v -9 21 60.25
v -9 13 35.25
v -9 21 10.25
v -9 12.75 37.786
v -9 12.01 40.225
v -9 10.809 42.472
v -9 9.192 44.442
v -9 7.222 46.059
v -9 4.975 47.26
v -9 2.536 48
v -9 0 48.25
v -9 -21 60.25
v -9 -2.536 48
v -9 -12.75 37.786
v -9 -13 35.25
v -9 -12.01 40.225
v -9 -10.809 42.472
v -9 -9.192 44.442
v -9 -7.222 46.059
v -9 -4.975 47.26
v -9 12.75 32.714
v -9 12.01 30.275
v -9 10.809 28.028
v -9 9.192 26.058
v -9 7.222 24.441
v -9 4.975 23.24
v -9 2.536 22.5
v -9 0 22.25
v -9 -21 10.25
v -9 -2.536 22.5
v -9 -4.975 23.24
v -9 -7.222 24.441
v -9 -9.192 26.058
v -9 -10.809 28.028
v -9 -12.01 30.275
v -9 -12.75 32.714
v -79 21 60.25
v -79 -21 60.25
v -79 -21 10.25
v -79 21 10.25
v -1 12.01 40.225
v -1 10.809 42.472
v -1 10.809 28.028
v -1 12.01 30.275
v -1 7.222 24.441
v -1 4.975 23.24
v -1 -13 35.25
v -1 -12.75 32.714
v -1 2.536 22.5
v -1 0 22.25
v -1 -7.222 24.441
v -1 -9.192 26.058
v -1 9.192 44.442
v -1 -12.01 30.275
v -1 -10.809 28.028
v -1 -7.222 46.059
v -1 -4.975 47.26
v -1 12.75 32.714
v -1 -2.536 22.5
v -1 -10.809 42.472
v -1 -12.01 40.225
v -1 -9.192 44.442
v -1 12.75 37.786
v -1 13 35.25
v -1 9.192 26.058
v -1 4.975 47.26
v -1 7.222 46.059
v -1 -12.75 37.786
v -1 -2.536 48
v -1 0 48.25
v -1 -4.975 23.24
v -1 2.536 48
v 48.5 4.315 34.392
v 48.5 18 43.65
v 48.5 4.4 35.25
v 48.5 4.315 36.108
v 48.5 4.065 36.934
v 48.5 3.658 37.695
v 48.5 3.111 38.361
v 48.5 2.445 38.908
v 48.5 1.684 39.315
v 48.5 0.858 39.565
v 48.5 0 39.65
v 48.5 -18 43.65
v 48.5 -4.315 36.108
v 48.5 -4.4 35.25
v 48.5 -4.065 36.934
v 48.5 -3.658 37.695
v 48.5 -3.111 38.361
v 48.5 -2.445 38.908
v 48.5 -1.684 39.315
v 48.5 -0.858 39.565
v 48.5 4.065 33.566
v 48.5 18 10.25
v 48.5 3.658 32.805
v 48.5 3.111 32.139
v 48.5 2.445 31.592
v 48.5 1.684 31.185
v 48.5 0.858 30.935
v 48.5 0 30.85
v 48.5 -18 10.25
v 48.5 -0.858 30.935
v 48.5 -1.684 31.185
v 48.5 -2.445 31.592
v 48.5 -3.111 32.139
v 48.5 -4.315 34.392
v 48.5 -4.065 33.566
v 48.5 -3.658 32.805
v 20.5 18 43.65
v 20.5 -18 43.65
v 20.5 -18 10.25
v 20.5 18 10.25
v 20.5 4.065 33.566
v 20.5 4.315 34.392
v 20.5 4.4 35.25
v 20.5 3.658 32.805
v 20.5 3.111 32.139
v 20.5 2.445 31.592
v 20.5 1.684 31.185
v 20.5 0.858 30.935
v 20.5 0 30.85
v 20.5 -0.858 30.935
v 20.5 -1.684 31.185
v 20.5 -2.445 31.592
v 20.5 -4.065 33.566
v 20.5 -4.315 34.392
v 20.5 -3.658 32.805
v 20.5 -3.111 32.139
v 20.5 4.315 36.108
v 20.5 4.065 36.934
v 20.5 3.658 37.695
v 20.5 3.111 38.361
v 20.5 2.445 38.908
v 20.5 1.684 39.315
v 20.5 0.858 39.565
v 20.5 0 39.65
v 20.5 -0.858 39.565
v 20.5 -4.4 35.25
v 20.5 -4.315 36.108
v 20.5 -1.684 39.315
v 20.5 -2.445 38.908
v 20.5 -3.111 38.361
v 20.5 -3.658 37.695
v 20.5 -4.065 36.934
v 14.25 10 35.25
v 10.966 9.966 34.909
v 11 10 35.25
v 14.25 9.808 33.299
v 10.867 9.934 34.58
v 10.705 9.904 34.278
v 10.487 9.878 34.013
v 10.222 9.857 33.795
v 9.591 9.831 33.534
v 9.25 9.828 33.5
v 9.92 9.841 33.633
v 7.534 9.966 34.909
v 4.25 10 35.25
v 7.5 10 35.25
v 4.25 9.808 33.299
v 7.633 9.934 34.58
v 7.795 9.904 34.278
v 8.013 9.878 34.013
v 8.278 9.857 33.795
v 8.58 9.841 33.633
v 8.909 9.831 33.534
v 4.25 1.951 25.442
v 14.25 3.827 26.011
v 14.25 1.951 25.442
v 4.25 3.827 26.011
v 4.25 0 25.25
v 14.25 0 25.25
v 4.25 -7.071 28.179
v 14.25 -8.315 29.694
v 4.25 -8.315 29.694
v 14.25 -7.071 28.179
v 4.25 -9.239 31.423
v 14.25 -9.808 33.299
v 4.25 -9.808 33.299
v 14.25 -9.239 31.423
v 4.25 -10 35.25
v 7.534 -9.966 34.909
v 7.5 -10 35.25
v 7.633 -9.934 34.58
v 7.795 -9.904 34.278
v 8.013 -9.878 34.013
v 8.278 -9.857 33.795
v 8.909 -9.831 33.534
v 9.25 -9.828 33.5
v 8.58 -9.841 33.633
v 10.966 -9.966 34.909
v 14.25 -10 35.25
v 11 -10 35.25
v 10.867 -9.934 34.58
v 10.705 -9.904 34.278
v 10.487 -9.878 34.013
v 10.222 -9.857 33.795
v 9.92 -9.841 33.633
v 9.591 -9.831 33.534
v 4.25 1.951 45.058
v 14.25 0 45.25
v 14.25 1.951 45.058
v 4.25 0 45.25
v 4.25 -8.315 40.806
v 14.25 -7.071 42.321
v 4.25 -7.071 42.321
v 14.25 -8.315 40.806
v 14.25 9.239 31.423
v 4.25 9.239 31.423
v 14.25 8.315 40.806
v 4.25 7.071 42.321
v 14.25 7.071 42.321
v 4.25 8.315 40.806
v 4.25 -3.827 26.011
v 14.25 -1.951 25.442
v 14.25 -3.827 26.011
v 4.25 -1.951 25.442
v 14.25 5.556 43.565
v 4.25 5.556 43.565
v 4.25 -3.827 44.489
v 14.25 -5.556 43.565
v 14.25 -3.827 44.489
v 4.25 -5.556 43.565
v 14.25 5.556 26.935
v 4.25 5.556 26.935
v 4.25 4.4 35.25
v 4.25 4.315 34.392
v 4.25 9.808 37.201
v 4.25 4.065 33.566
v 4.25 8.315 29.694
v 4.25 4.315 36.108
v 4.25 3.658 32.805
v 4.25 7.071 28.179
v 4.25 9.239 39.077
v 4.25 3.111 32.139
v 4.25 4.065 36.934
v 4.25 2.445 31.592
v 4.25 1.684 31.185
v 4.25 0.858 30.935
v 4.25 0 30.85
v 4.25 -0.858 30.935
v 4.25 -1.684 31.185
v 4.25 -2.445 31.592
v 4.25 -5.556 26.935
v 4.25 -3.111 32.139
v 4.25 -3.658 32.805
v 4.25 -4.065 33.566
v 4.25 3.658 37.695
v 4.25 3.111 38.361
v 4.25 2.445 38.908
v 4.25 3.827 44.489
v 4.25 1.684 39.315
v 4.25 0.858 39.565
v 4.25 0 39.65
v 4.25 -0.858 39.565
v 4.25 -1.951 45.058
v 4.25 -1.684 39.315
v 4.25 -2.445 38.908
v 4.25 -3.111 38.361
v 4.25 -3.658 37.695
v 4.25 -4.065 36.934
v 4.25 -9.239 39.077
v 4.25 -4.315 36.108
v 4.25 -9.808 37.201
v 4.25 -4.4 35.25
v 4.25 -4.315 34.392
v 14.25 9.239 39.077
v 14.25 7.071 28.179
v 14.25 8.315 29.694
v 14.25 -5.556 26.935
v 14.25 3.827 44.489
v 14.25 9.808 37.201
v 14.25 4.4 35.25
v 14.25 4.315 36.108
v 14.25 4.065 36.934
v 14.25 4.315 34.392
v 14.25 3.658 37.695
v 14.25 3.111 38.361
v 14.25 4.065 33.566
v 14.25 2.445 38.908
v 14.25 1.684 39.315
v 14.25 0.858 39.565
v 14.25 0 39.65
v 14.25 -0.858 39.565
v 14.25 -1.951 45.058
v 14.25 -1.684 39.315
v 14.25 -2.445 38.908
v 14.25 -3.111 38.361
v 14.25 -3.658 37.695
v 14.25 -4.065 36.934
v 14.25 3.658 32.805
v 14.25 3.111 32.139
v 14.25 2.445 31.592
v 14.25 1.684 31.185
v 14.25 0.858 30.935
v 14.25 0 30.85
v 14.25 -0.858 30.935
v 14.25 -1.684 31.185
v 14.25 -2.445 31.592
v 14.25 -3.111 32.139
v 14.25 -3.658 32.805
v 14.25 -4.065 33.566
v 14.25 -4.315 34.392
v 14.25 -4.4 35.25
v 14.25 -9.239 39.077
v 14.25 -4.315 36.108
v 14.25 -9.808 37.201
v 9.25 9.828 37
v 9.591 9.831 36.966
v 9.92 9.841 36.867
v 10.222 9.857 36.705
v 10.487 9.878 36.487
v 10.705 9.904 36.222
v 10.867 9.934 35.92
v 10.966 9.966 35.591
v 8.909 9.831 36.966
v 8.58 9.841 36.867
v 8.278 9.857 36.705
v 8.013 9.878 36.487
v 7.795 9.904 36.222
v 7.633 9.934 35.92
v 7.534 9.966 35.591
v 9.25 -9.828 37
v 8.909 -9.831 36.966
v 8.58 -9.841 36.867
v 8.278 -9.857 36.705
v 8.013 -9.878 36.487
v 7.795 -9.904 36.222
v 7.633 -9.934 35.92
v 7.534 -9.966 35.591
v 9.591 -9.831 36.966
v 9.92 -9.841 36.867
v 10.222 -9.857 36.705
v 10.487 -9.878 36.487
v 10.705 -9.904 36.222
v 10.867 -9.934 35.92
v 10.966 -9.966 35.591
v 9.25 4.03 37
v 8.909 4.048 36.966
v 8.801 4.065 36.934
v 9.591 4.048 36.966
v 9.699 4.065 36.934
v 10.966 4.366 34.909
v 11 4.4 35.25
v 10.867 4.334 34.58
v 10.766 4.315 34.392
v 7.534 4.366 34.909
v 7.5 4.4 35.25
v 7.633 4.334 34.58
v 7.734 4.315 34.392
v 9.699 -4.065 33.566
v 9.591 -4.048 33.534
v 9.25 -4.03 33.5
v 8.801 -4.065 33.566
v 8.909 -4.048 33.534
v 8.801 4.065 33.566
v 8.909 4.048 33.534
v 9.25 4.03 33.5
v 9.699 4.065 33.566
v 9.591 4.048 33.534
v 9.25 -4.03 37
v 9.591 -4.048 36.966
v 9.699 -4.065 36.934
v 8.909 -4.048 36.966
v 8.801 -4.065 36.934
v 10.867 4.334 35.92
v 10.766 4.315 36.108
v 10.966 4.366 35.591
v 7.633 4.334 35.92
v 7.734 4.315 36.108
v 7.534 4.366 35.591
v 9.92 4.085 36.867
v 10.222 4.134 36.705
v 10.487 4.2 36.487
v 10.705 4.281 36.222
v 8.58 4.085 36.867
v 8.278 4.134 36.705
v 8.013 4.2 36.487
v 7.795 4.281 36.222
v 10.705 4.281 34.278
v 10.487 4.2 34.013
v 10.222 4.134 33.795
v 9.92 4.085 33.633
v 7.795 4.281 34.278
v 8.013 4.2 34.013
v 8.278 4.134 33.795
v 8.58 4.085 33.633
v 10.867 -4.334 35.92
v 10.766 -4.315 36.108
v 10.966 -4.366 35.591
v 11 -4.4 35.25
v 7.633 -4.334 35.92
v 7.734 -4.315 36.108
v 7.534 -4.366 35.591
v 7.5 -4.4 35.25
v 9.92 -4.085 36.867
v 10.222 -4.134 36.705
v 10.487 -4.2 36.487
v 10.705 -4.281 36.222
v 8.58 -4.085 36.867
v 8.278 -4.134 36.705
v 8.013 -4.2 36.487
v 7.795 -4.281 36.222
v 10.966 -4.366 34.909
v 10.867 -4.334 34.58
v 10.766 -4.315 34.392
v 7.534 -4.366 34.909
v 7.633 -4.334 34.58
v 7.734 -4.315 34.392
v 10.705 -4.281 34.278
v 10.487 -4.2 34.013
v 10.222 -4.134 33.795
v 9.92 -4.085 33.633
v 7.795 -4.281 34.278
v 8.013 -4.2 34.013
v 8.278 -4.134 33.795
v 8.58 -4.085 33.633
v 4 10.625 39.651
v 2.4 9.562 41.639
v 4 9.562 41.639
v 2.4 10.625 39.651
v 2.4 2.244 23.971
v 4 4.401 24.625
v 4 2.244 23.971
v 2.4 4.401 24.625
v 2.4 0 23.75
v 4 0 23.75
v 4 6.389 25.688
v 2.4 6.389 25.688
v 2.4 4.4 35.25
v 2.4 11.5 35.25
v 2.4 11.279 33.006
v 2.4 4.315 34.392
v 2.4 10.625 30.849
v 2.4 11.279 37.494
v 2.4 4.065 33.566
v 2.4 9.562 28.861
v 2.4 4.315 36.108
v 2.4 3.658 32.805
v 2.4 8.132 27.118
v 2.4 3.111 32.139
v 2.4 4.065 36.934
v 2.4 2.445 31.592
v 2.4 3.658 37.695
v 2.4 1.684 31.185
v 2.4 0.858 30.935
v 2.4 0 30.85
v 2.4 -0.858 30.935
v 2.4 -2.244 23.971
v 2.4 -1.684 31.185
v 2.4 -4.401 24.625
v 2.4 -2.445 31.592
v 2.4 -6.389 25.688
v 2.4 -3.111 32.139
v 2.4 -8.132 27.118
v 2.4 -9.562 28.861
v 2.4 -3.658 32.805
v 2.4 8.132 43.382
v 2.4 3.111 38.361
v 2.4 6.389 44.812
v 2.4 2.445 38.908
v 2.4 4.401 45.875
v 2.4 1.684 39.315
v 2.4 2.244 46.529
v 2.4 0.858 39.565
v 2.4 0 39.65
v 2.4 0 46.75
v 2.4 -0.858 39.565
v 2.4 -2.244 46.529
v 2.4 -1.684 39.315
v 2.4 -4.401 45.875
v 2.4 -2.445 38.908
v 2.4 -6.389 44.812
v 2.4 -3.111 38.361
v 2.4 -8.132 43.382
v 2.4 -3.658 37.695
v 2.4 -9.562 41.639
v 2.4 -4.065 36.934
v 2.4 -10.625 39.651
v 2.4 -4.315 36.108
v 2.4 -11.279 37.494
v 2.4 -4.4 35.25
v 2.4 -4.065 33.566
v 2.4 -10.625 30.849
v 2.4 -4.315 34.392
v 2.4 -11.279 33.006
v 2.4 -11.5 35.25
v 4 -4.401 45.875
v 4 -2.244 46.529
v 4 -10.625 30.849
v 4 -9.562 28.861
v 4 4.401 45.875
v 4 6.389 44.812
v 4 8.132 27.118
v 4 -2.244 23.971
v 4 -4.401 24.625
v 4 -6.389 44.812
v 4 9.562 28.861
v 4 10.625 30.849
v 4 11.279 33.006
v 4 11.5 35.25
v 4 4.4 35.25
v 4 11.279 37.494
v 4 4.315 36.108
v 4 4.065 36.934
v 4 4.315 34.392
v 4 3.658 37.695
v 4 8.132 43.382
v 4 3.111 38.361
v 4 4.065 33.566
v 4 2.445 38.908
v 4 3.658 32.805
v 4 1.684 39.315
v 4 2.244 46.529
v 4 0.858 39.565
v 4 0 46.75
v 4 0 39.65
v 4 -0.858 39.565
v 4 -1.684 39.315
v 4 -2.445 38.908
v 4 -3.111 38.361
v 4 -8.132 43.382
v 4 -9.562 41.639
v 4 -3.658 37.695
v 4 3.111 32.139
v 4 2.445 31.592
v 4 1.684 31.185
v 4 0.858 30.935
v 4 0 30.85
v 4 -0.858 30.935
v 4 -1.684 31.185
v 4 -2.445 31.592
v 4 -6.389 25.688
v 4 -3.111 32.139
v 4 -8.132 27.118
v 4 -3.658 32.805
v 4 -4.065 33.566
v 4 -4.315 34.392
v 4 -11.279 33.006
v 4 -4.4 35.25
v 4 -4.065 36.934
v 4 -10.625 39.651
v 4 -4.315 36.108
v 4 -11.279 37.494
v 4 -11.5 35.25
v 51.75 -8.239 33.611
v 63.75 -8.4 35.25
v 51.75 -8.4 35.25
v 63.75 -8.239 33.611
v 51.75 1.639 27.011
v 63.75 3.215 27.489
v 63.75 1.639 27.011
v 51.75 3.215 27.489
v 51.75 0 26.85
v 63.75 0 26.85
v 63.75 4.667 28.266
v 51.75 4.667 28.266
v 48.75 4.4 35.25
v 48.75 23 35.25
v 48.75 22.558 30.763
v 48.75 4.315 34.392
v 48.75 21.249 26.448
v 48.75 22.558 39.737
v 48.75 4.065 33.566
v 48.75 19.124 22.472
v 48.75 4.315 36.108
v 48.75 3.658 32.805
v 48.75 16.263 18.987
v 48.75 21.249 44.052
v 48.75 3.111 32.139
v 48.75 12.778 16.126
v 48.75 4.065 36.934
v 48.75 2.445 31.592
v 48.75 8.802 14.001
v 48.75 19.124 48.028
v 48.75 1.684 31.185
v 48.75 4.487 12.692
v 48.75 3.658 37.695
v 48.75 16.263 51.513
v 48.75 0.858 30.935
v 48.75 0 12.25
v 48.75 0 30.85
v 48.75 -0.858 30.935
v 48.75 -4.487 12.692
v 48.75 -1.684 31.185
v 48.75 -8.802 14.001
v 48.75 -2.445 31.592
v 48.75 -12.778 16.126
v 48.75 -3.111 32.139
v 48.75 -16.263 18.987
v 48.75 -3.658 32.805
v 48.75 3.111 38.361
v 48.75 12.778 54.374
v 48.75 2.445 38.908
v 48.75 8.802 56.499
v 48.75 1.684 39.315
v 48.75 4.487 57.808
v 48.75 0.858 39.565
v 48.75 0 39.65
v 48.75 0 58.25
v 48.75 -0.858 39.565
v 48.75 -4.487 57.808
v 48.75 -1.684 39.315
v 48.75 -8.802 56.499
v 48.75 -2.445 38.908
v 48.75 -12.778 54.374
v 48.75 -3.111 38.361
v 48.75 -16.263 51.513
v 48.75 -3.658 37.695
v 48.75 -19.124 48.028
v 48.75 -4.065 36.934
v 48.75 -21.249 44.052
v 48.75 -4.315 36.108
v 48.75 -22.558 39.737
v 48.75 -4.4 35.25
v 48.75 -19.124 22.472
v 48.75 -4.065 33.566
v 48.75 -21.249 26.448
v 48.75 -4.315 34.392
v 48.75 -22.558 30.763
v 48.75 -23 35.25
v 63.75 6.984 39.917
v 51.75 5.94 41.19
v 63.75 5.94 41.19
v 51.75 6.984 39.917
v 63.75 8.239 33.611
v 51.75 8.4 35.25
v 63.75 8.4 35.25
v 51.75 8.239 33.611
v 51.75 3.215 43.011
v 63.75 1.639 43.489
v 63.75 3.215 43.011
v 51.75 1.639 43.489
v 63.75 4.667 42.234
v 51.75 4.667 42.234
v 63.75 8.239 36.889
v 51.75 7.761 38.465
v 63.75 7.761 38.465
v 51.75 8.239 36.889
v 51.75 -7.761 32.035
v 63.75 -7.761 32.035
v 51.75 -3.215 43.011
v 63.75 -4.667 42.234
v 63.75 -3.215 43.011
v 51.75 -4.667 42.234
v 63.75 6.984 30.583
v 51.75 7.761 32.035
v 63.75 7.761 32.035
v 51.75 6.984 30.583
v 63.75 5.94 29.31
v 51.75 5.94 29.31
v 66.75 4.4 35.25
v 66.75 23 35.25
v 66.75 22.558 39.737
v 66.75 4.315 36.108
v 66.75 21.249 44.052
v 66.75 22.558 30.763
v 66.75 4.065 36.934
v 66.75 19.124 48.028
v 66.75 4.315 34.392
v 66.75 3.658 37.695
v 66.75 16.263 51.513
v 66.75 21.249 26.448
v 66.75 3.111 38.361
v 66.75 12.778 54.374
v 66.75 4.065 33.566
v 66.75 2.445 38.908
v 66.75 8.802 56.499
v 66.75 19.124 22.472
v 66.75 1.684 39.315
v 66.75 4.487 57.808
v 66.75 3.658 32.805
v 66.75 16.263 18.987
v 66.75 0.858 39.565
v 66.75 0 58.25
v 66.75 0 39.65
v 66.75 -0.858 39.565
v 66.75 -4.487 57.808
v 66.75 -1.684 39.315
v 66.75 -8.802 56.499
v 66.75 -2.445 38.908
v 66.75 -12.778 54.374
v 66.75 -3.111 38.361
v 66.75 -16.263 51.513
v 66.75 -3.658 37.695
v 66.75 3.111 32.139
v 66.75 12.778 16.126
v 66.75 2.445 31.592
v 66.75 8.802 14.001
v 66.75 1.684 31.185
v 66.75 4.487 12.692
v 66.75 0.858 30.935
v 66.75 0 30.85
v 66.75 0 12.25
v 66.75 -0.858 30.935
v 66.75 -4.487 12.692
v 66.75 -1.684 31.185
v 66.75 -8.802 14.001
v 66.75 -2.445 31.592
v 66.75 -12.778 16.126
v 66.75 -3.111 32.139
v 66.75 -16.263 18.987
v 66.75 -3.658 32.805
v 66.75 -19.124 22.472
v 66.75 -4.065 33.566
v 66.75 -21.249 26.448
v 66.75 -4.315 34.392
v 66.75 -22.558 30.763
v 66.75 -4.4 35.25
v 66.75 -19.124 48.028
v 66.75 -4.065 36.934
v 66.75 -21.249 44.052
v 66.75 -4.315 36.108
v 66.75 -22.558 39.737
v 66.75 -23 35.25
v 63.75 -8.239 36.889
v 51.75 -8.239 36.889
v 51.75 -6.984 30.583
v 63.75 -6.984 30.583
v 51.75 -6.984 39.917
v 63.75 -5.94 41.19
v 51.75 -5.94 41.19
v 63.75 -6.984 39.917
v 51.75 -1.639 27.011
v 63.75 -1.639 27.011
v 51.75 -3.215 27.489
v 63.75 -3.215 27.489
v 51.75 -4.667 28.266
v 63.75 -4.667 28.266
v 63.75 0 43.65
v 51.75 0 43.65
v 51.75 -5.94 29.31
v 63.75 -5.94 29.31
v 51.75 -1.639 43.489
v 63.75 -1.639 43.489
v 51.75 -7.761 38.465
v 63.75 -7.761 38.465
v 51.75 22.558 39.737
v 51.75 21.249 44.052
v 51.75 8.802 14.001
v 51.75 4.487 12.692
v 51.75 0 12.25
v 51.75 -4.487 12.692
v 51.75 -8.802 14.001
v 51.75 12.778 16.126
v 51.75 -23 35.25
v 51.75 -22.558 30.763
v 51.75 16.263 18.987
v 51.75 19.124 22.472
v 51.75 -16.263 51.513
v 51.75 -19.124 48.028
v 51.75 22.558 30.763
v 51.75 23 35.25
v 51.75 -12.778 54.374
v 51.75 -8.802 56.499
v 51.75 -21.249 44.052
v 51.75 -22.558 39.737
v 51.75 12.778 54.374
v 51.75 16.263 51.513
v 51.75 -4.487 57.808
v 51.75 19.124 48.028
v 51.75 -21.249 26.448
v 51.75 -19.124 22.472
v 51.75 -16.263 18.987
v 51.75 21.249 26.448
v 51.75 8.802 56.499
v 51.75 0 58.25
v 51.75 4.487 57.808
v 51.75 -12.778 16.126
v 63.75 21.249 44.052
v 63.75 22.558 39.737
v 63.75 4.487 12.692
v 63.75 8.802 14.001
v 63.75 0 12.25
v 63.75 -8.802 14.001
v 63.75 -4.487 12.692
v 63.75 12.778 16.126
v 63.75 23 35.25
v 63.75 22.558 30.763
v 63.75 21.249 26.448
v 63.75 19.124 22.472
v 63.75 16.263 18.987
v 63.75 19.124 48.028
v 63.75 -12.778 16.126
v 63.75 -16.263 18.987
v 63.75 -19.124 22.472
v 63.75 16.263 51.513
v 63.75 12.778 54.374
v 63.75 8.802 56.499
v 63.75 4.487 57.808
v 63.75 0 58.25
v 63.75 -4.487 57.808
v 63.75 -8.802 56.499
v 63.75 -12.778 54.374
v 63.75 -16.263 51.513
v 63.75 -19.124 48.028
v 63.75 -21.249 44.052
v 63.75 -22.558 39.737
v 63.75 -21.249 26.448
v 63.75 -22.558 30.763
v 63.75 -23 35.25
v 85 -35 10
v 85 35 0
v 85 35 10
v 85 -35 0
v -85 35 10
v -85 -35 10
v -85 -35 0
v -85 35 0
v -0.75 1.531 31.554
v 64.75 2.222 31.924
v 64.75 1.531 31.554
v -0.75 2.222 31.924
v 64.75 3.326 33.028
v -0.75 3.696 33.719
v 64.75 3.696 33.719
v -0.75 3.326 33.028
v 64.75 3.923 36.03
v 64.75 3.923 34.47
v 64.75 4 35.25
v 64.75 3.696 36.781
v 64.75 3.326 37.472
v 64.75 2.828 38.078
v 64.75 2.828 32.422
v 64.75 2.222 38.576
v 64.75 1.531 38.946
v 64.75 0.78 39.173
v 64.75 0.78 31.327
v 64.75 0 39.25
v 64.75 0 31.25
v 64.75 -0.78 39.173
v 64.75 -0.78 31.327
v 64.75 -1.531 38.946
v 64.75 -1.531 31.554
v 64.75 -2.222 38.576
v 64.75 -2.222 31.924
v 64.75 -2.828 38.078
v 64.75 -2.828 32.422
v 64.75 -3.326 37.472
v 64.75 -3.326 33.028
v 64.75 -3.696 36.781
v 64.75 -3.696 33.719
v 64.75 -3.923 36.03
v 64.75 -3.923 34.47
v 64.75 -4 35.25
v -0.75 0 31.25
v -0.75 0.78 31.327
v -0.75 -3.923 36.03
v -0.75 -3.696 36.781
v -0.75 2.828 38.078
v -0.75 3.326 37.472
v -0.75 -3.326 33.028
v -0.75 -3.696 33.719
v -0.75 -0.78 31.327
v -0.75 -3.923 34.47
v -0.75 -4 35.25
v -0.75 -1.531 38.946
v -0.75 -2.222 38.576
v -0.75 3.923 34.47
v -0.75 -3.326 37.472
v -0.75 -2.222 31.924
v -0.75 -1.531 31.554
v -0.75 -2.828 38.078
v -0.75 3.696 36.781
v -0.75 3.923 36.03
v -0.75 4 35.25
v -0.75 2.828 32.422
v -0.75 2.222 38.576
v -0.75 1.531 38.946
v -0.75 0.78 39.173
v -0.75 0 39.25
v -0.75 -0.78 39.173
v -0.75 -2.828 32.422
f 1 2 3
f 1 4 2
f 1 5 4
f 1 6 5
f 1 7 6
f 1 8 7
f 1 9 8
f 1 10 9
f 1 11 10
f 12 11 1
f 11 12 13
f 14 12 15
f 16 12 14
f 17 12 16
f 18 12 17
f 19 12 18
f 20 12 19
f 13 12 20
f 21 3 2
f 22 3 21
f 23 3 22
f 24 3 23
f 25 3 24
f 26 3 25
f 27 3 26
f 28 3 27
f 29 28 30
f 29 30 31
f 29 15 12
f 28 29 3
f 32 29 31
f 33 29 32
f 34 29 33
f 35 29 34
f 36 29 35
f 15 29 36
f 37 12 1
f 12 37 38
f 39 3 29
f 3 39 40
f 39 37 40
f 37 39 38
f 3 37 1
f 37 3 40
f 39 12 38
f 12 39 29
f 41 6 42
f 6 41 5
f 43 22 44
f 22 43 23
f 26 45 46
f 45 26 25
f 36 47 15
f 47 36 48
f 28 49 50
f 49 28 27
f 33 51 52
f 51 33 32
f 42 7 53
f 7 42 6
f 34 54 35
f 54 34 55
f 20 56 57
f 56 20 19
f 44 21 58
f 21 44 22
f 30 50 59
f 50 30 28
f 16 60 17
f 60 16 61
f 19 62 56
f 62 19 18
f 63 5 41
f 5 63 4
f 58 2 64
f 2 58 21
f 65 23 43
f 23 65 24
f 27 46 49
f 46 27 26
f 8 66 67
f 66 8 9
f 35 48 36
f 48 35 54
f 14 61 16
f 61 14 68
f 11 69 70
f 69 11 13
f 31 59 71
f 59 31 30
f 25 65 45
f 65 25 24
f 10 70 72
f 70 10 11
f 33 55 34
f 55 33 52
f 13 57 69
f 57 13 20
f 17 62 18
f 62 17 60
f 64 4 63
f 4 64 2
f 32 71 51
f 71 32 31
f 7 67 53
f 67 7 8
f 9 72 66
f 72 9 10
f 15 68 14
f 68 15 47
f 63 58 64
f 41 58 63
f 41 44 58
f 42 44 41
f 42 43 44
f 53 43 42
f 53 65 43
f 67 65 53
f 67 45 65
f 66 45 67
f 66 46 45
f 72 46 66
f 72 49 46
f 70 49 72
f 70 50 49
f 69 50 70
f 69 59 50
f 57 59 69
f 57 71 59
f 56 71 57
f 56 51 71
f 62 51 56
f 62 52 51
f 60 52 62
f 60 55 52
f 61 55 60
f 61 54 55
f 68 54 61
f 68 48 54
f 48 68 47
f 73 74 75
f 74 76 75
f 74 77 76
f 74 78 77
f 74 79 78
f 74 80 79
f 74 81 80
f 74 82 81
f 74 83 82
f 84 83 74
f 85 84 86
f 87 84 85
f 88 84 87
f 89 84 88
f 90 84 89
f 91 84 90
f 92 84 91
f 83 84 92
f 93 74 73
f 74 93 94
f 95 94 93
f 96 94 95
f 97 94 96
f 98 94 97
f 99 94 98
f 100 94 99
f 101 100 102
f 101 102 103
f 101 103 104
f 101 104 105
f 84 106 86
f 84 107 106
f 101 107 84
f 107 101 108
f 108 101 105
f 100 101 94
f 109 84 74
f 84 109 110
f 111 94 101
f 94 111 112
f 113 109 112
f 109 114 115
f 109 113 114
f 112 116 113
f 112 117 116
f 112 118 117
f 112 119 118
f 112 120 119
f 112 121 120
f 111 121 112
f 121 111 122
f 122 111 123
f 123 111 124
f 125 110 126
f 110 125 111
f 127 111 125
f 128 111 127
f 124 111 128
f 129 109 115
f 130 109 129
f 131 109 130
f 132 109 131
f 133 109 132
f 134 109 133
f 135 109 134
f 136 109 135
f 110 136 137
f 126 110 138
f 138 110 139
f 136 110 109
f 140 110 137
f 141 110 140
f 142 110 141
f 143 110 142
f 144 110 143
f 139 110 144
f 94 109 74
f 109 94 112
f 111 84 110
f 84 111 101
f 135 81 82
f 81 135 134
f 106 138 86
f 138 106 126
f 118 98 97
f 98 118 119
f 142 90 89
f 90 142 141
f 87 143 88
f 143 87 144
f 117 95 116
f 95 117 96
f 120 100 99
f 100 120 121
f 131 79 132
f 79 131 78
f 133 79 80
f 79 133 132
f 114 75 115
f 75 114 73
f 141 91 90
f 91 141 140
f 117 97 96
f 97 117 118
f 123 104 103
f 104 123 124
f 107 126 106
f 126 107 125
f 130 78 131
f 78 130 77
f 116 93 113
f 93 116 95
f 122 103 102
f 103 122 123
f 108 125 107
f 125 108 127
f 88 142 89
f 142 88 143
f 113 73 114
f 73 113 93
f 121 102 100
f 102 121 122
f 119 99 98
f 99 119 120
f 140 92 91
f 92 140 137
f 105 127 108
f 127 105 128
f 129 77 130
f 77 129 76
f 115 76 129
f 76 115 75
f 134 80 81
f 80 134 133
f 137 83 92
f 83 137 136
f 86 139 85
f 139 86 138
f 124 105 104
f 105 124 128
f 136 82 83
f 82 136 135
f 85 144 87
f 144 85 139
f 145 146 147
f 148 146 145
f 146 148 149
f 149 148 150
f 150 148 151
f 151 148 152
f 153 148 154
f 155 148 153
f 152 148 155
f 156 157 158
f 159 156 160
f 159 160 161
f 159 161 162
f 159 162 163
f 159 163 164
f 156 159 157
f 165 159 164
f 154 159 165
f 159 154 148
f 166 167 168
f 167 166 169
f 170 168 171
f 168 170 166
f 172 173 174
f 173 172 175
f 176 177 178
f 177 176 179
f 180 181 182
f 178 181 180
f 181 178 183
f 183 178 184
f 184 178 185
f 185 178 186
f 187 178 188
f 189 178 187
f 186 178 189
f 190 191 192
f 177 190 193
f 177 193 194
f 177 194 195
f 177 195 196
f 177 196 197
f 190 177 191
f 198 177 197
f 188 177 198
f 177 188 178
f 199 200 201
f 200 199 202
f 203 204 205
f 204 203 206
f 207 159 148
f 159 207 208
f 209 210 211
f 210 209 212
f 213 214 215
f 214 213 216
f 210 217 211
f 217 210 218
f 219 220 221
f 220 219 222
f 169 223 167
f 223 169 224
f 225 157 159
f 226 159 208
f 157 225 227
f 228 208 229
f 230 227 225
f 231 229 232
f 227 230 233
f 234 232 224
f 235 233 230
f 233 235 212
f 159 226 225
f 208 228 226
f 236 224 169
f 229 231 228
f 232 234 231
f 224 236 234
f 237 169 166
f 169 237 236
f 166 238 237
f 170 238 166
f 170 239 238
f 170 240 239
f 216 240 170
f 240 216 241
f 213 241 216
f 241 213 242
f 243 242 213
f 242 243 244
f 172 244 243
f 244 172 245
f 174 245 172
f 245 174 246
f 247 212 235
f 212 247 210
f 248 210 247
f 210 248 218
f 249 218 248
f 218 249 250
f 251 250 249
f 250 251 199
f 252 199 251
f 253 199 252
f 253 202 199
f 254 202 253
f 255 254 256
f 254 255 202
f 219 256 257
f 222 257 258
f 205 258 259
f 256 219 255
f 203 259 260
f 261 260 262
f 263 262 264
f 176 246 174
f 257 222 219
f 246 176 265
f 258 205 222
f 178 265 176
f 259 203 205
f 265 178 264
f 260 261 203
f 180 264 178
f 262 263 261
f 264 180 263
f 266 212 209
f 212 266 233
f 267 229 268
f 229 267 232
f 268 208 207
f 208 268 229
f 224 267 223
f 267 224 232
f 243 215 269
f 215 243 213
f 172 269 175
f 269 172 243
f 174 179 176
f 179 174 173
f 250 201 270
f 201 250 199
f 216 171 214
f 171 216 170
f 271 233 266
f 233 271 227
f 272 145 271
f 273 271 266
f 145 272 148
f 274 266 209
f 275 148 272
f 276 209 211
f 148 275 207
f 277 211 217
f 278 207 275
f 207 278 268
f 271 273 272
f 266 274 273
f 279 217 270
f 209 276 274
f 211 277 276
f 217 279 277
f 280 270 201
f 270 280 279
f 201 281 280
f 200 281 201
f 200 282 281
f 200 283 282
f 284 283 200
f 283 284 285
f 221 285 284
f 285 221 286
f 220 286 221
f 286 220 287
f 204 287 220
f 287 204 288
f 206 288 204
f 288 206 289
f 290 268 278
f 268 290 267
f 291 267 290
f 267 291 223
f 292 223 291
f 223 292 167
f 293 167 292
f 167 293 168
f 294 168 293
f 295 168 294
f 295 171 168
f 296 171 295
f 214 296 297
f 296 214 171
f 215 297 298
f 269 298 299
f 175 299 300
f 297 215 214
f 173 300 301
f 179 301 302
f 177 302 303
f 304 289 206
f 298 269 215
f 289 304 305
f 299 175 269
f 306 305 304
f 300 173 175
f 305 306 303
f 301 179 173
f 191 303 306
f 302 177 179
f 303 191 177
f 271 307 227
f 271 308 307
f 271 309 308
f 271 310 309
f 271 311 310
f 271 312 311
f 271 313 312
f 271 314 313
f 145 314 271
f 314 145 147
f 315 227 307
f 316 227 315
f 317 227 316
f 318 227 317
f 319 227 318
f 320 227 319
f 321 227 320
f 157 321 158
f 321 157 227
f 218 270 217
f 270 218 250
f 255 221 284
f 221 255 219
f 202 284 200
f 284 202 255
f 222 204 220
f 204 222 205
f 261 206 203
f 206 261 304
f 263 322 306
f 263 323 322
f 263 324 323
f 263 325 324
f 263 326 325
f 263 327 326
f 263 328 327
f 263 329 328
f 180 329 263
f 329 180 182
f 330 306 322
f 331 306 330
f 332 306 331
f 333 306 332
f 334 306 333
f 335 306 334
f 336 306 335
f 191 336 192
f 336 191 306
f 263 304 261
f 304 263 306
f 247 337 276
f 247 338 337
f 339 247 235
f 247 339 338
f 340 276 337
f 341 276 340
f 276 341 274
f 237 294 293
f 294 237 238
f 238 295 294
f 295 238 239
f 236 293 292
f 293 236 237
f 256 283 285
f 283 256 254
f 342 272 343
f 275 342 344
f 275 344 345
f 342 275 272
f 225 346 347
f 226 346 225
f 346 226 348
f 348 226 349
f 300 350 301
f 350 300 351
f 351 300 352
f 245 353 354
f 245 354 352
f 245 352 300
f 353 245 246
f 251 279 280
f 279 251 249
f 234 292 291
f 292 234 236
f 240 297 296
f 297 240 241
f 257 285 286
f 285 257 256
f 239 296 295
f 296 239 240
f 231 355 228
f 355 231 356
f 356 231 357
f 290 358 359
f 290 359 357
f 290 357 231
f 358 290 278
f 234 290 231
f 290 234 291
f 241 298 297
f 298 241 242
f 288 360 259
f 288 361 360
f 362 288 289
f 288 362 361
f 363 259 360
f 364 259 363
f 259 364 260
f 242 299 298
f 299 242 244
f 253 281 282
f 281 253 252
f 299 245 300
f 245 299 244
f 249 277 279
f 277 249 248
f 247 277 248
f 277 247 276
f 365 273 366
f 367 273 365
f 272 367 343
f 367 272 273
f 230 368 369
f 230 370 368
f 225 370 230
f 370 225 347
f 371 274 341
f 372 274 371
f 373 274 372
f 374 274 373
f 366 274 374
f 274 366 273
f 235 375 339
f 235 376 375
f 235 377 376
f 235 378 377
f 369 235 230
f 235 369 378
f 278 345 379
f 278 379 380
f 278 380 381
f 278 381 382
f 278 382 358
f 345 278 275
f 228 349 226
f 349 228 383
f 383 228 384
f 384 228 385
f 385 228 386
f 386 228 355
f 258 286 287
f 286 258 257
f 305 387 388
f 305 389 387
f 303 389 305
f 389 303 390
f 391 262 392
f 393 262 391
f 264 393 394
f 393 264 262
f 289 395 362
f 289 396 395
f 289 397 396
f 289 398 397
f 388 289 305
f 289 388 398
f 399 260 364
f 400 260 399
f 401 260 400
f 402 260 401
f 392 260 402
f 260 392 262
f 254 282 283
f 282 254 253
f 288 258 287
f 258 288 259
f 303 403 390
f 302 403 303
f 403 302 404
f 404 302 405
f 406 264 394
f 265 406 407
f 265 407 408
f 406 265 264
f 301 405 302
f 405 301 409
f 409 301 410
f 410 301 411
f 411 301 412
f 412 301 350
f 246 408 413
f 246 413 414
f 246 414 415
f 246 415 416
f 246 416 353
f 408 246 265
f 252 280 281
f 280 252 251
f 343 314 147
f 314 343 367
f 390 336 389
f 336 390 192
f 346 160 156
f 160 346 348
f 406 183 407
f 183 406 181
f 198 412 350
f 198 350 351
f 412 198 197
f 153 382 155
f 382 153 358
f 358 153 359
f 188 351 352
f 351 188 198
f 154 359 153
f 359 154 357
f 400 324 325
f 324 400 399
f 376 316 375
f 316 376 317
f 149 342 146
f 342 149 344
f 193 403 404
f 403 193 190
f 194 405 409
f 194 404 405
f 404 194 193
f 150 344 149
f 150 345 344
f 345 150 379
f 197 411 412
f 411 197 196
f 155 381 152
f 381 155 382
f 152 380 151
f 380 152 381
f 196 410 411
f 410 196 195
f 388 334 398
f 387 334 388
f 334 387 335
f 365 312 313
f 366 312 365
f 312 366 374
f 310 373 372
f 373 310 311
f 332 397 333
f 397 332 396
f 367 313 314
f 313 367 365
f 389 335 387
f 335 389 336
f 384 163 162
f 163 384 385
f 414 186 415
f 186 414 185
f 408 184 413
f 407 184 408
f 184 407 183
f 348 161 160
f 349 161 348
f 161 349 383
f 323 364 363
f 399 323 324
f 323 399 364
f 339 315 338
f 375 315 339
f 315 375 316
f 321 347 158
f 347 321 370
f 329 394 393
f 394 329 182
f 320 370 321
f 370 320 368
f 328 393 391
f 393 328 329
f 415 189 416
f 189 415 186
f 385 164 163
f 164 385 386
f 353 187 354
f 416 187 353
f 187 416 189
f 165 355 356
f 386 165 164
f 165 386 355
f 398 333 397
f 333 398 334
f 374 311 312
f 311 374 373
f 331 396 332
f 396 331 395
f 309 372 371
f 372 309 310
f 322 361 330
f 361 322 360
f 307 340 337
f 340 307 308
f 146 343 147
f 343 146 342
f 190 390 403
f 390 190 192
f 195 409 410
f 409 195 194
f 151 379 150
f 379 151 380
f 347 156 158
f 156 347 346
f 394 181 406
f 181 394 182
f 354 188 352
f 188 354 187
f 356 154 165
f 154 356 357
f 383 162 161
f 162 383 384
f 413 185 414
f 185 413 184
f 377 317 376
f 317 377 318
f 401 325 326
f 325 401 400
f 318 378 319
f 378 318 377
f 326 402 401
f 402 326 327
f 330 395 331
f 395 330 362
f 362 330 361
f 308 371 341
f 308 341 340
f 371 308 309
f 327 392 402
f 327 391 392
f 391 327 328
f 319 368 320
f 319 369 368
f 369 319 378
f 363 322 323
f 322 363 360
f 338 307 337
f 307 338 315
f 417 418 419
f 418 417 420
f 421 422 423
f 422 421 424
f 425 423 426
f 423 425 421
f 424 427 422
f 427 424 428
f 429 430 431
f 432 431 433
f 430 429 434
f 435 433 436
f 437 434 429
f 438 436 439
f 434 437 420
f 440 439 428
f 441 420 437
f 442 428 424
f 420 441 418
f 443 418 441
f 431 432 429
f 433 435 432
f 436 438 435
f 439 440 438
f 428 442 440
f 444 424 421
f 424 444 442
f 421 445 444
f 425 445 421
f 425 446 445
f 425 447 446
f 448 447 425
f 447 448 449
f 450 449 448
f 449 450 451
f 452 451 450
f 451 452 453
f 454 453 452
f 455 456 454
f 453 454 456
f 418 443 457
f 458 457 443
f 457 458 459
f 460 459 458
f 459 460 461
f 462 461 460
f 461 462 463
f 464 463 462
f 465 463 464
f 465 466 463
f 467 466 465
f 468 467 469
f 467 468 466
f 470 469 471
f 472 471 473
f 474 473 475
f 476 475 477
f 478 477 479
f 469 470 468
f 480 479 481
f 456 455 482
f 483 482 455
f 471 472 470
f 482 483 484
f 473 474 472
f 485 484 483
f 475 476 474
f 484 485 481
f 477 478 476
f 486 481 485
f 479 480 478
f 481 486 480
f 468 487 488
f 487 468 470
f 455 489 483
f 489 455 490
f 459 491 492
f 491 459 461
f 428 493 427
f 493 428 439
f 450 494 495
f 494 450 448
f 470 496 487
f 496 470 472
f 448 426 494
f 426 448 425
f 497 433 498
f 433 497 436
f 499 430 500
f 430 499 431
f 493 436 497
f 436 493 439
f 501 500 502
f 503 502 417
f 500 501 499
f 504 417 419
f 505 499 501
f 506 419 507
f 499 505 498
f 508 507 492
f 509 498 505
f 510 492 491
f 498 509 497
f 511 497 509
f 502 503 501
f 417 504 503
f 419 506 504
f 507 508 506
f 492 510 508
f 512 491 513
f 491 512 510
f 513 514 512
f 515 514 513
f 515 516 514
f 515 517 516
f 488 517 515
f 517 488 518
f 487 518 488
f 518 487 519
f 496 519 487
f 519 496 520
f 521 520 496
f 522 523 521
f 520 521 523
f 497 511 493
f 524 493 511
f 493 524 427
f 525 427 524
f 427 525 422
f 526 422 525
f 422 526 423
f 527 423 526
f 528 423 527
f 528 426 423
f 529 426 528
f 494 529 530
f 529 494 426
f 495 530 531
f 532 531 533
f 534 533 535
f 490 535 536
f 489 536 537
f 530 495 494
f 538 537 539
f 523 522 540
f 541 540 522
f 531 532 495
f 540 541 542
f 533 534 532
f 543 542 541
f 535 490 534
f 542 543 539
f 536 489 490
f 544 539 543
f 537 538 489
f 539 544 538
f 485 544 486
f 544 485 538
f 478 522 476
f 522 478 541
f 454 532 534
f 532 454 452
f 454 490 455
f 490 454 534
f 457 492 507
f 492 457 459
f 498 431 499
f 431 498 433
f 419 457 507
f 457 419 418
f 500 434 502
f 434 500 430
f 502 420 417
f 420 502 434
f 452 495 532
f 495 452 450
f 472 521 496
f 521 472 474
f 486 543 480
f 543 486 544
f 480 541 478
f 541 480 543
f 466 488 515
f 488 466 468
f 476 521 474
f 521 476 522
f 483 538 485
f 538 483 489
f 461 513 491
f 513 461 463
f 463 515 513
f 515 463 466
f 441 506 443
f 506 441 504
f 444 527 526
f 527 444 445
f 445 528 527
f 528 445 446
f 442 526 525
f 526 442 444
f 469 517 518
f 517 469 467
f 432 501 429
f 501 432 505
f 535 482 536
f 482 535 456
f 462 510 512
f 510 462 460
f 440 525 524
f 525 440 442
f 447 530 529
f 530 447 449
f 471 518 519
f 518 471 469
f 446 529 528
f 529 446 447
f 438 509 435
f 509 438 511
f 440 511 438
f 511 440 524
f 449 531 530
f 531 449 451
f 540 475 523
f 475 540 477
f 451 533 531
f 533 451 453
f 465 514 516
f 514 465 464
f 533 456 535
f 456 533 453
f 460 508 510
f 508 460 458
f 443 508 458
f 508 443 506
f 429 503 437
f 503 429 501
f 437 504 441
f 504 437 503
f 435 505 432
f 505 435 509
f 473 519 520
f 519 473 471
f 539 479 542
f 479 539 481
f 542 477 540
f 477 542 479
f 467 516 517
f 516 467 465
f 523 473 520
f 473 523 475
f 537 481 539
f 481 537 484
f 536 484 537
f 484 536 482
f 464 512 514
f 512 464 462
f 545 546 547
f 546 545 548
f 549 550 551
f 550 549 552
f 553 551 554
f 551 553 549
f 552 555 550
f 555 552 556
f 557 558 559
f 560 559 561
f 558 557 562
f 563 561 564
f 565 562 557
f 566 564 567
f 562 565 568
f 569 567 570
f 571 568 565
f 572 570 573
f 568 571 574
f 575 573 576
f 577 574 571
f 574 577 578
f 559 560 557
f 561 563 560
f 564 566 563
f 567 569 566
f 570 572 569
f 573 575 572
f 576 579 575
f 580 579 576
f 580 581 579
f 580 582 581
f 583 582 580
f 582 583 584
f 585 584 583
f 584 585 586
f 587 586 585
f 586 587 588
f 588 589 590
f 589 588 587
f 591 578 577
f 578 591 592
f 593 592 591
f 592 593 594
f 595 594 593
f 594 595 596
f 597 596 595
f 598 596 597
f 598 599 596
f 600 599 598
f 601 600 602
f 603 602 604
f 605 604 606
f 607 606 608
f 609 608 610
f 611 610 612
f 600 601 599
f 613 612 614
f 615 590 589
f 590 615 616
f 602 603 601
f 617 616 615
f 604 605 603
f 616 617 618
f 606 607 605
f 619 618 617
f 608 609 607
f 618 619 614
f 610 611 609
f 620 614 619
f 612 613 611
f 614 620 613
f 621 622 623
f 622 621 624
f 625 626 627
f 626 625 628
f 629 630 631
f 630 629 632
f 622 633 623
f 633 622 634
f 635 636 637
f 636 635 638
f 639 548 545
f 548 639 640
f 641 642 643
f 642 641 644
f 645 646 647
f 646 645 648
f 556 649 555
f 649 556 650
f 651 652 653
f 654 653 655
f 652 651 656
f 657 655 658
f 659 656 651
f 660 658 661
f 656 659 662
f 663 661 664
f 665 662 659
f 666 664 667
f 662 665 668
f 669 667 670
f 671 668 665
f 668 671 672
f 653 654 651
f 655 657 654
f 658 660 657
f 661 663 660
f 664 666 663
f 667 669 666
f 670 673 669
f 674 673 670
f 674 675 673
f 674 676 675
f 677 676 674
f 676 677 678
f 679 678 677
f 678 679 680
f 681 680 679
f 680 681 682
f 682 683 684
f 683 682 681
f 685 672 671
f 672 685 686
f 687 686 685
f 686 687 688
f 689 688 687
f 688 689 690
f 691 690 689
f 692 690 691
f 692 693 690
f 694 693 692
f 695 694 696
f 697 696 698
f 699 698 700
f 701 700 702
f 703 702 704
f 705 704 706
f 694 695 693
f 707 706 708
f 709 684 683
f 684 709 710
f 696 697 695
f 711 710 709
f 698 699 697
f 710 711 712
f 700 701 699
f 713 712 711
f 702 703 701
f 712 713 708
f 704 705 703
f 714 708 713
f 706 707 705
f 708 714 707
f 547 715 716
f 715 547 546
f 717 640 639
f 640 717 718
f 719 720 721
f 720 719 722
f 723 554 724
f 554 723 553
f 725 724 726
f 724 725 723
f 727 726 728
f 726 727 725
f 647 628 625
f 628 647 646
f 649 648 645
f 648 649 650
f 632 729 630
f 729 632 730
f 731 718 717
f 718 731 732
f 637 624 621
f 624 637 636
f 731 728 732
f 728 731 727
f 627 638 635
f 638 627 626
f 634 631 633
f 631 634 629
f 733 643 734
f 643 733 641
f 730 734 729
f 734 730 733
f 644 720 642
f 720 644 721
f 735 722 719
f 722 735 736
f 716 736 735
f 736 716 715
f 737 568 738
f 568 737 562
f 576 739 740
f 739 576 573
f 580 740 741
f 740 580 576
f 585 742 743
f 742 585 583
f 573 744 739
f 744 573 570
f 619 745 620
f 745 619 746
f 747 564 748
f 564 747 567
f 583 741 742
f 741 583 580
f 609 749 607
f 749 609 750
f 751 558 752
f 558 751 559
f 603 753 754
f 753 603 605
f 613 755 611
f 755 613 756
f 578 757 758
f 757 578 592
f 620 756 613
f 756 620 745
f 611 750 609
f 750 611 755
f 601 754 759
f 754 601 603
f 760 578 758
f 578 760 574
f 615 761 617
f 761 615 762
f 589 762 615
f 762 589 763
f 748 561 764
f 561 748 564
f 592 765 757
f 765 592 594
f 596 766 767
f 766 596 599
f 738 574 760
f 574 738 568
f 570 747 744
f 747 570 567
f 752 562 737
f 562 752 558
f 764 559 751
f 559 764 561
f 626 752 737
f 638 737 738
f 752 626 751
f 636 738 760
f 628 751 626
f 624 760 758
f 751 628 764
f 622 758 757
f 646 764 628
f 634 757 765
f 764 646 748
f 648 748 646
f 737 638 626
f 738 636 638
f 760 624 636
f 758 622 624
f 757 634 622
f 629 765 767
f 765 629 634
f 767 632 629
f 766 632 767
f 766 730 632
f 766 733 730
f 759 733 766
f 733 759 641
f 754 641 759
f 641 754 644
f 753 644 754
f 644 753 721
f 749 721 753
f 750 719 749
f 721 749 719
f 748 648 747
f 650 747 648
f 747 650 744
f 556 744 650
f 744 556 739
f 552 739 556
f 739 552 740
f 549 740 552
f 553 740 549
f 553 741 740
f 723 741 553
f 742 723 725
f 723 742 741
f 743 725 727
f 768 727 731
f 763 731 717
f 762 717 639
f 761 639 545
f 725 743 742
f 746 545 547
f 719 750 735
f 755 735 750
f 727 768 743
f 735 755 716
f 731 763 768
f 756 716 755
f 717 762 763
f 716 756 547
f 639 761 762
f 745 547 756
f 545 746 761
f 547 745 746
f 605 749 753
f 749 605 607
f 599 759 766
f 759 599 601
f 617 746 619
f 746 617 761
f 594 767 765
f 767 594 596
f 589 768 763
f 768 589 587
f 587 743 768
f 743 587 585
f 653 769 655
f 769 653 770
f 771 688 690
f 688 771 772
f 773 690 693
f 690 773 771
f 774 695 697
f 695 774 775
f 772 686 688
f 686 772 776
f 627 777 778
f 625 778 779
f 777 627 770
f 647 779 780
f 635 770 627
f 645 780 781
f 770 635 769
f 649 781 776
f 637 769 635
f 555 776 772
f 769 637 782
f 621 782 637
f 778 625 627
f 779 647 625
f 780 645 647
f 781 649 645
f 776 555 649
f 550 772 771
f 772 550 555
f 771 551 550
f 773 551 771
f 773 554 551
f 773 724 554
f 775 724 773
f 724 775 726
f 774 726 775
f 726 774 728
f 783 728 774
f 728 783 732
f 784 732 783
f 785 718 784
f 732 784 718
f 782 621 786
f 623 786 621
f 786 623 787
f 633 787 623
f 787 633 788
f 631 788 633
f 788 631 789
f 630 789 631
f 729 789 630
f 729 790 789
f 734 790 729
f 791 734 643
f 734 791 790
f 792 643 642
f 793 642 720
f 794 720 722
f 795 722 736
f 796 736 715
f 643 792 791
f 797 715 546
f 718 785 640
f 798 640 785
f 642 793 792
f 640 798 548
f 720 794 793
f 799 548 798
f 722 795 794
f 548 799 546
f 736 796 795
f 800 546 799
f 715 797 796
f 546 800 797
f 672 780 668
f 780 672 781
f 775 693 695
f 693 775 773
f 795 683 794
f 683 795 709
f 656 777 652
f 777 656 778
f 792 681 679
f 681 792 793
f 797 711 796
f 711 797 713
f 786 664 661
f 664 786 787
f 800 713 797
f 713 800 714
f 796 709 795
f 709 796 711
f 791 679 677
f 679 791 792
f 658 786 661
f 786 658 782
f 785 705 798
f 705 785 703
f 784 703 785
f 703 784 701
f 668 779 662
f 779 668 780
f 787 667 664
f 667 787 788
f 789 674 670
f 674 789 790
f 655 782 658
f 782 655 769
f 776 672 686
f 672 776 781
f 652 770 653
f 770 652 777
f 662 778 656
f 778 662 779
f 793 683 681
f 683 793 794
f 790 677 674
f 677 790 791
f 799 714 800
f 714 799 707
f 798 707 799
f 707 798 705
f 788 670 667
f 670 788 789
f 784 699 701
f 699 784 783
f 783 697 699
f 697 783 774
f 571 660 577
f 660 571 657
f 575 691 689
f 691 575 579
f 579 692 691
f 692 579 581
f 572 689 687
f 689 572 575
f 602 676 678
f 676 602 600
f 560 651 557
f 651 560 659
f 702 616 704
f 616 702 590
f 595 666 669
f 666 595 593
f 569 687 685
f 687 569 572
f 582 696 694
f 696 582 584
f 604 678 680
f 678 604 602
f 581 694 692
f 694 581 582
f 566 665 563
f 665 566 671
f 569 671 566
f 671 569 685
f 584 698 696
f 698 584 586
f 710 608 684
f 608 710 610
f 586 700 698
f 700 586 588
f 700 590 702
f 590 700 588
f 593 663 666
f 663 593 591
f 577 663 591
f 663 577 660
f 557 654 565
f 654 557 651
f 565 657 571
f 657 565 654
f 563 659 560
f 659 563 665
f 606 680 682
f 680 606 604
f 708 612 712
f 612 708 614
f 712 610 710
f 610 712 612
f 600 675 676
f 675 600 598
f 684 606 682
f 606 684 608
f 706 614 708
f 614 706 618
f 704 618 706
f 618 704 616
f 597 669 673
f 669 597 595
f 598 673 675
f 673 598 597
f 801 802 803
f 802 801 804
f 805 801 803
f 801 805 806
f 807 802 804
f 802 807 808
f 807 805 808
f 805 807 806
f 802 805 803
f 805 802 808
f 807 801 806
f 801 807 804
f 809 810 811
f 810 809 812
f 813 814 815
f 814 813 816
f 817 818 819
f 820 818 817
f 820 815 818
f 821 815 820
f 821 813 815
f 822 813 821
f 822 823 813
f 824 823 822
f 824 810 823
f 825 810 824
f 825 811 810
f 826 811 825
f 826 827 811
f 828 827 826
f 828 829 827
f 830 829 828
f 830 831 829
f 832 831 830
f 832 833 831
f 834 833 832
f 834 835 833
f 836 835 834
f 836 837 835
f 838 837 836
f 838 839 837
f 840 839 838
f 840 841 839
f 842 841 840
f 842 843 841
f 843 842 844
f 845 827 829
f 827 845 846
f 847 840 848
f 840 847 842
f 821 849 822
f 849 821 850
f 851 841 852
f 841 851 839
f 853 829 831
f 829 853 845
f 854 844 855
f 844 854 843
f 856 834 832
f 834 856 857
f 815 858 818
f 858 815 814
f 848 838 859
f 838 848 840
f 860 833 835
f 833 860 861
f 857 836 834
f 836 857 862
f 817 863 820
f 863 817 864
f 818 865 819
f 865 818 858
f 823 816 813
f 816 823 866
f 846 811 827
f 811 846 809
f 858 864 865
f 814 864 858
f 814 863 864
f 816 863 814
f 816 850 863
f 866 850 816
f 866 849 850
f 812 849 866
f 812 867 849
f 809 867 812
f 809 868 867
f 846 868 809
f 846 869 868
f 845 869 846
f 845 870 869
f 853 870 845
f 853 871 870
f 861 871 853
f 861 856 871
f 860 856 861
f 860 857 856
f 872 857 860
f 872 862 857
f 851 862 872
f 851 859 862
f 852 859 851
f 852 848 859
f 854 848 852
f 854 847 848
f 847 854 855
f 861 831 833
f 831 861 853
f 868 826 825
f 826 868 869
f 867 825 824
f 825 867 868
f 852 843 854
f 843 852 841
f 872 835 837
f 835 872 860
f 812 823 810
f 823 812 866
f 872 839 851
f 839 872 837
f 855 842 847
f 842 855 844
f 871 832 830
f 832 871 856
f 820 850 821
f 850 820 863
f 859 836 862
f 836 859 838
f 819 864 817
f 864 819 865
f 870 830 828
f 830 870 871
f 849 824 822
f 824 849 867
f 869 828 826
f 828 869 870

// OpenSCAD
$fn = 32;

// ------------------------------------------------------------------------
// Motor drive station: motor 70 x 50 mm, shaft d8, pulley d46
// Every part is its own module, assembly() places every instance.
// ------------------------------------------------------------------------

// --- part 1 ---
module station_bed() {
  difference() {
    translate([-85, -35, 0]) cube([170, 70, 10]);
  }
}

// --- part 2 ---
module drive_motor() {
  union() {
    translate([-35, -21, 0]) cube([70, 42, 50]);
    translate([39, 0, 25]) rotate([0, 90, 0]) cylinder(h = 8, d = 26, center = true);
  }
}

// --- part 3 ---
module pillow_block() {
  difference() {
    translate([-14, -18, 0]) cube([28, 36, 33.4]);
    translate([0, 0, 25]) rotate([0, 90, 0]) cylinder(h = 30, d = 8.8, center = true);
  }
}

// --- part 4 ---
module drive_shaft() {
  translate([0, 0, -32.75]) cylinder(h = 65.5, d = 8);
}

// --- part 5 ---
module shaft_collar() {
  difference() {
    cylinder(h = 10, d = 20);
    translate([0, 0, -1]) cylinder(h = 12, d = 8.8);
    translate([0, 0, 5]) rotate([90, 0, 0]) cylinder(h = 22, d = 3.5, center = true);
  }
}

// --- part 6 ---
module collar_washer() {
  difference() {
      translate([0, 0, 0]) cylinder(h = 1.6, d = 23);
      translate([0, 0, -1]) cylinder(h = 3.6, d = 8.8);
    }
}

// --- part 7 ---
module drive_pulley() {
  difference() {
    union() {
      cylinder(h = 18, d = 16.8);
      cylinder(h = 3, d = 46);
      translate([0, 0, 15]) cylinder(h = 3, d = 46);
    }
    translate([0, 0, -1]) cylinder(h = 20, d = 8.8);
  }
}

// --- assembly ---
module assembly() {
  color([0.80, 0.24, 0.20]) translate([0, 0, 0]) rotate([0, 0, 0]) station_bed();
  color([0.20, 0.45, 0.75]) translate([-44, 0, 10.25]) rotate([0, 0, 0]) drive_motor();
  color([0.25, 0.62, 0.32]) translate([34.5, 0, 10.25]) rotate([0, 0, 0]) pillow_block();
  color([0.92, 0.70, 0.18]) translate([32, 0, 35.25]) rotate([0, 90, 0]) drive_shaft();
  color([0.58, 0.35, 0.70]) translate([4.25, 0, 35.25]) rotate([0, 90, 0]) shaft_collar();
  color([0.16, 0.66, 0.66]) translate([2.4, 0, 35.25]) rotate([0, 90, 0]) collar_washer();
  color([0.85, 0.48, 0.18]) translate([48.75, 0, 35.25]) rotate([0, 90, 0]) drive_pulley();
}

assembly();
